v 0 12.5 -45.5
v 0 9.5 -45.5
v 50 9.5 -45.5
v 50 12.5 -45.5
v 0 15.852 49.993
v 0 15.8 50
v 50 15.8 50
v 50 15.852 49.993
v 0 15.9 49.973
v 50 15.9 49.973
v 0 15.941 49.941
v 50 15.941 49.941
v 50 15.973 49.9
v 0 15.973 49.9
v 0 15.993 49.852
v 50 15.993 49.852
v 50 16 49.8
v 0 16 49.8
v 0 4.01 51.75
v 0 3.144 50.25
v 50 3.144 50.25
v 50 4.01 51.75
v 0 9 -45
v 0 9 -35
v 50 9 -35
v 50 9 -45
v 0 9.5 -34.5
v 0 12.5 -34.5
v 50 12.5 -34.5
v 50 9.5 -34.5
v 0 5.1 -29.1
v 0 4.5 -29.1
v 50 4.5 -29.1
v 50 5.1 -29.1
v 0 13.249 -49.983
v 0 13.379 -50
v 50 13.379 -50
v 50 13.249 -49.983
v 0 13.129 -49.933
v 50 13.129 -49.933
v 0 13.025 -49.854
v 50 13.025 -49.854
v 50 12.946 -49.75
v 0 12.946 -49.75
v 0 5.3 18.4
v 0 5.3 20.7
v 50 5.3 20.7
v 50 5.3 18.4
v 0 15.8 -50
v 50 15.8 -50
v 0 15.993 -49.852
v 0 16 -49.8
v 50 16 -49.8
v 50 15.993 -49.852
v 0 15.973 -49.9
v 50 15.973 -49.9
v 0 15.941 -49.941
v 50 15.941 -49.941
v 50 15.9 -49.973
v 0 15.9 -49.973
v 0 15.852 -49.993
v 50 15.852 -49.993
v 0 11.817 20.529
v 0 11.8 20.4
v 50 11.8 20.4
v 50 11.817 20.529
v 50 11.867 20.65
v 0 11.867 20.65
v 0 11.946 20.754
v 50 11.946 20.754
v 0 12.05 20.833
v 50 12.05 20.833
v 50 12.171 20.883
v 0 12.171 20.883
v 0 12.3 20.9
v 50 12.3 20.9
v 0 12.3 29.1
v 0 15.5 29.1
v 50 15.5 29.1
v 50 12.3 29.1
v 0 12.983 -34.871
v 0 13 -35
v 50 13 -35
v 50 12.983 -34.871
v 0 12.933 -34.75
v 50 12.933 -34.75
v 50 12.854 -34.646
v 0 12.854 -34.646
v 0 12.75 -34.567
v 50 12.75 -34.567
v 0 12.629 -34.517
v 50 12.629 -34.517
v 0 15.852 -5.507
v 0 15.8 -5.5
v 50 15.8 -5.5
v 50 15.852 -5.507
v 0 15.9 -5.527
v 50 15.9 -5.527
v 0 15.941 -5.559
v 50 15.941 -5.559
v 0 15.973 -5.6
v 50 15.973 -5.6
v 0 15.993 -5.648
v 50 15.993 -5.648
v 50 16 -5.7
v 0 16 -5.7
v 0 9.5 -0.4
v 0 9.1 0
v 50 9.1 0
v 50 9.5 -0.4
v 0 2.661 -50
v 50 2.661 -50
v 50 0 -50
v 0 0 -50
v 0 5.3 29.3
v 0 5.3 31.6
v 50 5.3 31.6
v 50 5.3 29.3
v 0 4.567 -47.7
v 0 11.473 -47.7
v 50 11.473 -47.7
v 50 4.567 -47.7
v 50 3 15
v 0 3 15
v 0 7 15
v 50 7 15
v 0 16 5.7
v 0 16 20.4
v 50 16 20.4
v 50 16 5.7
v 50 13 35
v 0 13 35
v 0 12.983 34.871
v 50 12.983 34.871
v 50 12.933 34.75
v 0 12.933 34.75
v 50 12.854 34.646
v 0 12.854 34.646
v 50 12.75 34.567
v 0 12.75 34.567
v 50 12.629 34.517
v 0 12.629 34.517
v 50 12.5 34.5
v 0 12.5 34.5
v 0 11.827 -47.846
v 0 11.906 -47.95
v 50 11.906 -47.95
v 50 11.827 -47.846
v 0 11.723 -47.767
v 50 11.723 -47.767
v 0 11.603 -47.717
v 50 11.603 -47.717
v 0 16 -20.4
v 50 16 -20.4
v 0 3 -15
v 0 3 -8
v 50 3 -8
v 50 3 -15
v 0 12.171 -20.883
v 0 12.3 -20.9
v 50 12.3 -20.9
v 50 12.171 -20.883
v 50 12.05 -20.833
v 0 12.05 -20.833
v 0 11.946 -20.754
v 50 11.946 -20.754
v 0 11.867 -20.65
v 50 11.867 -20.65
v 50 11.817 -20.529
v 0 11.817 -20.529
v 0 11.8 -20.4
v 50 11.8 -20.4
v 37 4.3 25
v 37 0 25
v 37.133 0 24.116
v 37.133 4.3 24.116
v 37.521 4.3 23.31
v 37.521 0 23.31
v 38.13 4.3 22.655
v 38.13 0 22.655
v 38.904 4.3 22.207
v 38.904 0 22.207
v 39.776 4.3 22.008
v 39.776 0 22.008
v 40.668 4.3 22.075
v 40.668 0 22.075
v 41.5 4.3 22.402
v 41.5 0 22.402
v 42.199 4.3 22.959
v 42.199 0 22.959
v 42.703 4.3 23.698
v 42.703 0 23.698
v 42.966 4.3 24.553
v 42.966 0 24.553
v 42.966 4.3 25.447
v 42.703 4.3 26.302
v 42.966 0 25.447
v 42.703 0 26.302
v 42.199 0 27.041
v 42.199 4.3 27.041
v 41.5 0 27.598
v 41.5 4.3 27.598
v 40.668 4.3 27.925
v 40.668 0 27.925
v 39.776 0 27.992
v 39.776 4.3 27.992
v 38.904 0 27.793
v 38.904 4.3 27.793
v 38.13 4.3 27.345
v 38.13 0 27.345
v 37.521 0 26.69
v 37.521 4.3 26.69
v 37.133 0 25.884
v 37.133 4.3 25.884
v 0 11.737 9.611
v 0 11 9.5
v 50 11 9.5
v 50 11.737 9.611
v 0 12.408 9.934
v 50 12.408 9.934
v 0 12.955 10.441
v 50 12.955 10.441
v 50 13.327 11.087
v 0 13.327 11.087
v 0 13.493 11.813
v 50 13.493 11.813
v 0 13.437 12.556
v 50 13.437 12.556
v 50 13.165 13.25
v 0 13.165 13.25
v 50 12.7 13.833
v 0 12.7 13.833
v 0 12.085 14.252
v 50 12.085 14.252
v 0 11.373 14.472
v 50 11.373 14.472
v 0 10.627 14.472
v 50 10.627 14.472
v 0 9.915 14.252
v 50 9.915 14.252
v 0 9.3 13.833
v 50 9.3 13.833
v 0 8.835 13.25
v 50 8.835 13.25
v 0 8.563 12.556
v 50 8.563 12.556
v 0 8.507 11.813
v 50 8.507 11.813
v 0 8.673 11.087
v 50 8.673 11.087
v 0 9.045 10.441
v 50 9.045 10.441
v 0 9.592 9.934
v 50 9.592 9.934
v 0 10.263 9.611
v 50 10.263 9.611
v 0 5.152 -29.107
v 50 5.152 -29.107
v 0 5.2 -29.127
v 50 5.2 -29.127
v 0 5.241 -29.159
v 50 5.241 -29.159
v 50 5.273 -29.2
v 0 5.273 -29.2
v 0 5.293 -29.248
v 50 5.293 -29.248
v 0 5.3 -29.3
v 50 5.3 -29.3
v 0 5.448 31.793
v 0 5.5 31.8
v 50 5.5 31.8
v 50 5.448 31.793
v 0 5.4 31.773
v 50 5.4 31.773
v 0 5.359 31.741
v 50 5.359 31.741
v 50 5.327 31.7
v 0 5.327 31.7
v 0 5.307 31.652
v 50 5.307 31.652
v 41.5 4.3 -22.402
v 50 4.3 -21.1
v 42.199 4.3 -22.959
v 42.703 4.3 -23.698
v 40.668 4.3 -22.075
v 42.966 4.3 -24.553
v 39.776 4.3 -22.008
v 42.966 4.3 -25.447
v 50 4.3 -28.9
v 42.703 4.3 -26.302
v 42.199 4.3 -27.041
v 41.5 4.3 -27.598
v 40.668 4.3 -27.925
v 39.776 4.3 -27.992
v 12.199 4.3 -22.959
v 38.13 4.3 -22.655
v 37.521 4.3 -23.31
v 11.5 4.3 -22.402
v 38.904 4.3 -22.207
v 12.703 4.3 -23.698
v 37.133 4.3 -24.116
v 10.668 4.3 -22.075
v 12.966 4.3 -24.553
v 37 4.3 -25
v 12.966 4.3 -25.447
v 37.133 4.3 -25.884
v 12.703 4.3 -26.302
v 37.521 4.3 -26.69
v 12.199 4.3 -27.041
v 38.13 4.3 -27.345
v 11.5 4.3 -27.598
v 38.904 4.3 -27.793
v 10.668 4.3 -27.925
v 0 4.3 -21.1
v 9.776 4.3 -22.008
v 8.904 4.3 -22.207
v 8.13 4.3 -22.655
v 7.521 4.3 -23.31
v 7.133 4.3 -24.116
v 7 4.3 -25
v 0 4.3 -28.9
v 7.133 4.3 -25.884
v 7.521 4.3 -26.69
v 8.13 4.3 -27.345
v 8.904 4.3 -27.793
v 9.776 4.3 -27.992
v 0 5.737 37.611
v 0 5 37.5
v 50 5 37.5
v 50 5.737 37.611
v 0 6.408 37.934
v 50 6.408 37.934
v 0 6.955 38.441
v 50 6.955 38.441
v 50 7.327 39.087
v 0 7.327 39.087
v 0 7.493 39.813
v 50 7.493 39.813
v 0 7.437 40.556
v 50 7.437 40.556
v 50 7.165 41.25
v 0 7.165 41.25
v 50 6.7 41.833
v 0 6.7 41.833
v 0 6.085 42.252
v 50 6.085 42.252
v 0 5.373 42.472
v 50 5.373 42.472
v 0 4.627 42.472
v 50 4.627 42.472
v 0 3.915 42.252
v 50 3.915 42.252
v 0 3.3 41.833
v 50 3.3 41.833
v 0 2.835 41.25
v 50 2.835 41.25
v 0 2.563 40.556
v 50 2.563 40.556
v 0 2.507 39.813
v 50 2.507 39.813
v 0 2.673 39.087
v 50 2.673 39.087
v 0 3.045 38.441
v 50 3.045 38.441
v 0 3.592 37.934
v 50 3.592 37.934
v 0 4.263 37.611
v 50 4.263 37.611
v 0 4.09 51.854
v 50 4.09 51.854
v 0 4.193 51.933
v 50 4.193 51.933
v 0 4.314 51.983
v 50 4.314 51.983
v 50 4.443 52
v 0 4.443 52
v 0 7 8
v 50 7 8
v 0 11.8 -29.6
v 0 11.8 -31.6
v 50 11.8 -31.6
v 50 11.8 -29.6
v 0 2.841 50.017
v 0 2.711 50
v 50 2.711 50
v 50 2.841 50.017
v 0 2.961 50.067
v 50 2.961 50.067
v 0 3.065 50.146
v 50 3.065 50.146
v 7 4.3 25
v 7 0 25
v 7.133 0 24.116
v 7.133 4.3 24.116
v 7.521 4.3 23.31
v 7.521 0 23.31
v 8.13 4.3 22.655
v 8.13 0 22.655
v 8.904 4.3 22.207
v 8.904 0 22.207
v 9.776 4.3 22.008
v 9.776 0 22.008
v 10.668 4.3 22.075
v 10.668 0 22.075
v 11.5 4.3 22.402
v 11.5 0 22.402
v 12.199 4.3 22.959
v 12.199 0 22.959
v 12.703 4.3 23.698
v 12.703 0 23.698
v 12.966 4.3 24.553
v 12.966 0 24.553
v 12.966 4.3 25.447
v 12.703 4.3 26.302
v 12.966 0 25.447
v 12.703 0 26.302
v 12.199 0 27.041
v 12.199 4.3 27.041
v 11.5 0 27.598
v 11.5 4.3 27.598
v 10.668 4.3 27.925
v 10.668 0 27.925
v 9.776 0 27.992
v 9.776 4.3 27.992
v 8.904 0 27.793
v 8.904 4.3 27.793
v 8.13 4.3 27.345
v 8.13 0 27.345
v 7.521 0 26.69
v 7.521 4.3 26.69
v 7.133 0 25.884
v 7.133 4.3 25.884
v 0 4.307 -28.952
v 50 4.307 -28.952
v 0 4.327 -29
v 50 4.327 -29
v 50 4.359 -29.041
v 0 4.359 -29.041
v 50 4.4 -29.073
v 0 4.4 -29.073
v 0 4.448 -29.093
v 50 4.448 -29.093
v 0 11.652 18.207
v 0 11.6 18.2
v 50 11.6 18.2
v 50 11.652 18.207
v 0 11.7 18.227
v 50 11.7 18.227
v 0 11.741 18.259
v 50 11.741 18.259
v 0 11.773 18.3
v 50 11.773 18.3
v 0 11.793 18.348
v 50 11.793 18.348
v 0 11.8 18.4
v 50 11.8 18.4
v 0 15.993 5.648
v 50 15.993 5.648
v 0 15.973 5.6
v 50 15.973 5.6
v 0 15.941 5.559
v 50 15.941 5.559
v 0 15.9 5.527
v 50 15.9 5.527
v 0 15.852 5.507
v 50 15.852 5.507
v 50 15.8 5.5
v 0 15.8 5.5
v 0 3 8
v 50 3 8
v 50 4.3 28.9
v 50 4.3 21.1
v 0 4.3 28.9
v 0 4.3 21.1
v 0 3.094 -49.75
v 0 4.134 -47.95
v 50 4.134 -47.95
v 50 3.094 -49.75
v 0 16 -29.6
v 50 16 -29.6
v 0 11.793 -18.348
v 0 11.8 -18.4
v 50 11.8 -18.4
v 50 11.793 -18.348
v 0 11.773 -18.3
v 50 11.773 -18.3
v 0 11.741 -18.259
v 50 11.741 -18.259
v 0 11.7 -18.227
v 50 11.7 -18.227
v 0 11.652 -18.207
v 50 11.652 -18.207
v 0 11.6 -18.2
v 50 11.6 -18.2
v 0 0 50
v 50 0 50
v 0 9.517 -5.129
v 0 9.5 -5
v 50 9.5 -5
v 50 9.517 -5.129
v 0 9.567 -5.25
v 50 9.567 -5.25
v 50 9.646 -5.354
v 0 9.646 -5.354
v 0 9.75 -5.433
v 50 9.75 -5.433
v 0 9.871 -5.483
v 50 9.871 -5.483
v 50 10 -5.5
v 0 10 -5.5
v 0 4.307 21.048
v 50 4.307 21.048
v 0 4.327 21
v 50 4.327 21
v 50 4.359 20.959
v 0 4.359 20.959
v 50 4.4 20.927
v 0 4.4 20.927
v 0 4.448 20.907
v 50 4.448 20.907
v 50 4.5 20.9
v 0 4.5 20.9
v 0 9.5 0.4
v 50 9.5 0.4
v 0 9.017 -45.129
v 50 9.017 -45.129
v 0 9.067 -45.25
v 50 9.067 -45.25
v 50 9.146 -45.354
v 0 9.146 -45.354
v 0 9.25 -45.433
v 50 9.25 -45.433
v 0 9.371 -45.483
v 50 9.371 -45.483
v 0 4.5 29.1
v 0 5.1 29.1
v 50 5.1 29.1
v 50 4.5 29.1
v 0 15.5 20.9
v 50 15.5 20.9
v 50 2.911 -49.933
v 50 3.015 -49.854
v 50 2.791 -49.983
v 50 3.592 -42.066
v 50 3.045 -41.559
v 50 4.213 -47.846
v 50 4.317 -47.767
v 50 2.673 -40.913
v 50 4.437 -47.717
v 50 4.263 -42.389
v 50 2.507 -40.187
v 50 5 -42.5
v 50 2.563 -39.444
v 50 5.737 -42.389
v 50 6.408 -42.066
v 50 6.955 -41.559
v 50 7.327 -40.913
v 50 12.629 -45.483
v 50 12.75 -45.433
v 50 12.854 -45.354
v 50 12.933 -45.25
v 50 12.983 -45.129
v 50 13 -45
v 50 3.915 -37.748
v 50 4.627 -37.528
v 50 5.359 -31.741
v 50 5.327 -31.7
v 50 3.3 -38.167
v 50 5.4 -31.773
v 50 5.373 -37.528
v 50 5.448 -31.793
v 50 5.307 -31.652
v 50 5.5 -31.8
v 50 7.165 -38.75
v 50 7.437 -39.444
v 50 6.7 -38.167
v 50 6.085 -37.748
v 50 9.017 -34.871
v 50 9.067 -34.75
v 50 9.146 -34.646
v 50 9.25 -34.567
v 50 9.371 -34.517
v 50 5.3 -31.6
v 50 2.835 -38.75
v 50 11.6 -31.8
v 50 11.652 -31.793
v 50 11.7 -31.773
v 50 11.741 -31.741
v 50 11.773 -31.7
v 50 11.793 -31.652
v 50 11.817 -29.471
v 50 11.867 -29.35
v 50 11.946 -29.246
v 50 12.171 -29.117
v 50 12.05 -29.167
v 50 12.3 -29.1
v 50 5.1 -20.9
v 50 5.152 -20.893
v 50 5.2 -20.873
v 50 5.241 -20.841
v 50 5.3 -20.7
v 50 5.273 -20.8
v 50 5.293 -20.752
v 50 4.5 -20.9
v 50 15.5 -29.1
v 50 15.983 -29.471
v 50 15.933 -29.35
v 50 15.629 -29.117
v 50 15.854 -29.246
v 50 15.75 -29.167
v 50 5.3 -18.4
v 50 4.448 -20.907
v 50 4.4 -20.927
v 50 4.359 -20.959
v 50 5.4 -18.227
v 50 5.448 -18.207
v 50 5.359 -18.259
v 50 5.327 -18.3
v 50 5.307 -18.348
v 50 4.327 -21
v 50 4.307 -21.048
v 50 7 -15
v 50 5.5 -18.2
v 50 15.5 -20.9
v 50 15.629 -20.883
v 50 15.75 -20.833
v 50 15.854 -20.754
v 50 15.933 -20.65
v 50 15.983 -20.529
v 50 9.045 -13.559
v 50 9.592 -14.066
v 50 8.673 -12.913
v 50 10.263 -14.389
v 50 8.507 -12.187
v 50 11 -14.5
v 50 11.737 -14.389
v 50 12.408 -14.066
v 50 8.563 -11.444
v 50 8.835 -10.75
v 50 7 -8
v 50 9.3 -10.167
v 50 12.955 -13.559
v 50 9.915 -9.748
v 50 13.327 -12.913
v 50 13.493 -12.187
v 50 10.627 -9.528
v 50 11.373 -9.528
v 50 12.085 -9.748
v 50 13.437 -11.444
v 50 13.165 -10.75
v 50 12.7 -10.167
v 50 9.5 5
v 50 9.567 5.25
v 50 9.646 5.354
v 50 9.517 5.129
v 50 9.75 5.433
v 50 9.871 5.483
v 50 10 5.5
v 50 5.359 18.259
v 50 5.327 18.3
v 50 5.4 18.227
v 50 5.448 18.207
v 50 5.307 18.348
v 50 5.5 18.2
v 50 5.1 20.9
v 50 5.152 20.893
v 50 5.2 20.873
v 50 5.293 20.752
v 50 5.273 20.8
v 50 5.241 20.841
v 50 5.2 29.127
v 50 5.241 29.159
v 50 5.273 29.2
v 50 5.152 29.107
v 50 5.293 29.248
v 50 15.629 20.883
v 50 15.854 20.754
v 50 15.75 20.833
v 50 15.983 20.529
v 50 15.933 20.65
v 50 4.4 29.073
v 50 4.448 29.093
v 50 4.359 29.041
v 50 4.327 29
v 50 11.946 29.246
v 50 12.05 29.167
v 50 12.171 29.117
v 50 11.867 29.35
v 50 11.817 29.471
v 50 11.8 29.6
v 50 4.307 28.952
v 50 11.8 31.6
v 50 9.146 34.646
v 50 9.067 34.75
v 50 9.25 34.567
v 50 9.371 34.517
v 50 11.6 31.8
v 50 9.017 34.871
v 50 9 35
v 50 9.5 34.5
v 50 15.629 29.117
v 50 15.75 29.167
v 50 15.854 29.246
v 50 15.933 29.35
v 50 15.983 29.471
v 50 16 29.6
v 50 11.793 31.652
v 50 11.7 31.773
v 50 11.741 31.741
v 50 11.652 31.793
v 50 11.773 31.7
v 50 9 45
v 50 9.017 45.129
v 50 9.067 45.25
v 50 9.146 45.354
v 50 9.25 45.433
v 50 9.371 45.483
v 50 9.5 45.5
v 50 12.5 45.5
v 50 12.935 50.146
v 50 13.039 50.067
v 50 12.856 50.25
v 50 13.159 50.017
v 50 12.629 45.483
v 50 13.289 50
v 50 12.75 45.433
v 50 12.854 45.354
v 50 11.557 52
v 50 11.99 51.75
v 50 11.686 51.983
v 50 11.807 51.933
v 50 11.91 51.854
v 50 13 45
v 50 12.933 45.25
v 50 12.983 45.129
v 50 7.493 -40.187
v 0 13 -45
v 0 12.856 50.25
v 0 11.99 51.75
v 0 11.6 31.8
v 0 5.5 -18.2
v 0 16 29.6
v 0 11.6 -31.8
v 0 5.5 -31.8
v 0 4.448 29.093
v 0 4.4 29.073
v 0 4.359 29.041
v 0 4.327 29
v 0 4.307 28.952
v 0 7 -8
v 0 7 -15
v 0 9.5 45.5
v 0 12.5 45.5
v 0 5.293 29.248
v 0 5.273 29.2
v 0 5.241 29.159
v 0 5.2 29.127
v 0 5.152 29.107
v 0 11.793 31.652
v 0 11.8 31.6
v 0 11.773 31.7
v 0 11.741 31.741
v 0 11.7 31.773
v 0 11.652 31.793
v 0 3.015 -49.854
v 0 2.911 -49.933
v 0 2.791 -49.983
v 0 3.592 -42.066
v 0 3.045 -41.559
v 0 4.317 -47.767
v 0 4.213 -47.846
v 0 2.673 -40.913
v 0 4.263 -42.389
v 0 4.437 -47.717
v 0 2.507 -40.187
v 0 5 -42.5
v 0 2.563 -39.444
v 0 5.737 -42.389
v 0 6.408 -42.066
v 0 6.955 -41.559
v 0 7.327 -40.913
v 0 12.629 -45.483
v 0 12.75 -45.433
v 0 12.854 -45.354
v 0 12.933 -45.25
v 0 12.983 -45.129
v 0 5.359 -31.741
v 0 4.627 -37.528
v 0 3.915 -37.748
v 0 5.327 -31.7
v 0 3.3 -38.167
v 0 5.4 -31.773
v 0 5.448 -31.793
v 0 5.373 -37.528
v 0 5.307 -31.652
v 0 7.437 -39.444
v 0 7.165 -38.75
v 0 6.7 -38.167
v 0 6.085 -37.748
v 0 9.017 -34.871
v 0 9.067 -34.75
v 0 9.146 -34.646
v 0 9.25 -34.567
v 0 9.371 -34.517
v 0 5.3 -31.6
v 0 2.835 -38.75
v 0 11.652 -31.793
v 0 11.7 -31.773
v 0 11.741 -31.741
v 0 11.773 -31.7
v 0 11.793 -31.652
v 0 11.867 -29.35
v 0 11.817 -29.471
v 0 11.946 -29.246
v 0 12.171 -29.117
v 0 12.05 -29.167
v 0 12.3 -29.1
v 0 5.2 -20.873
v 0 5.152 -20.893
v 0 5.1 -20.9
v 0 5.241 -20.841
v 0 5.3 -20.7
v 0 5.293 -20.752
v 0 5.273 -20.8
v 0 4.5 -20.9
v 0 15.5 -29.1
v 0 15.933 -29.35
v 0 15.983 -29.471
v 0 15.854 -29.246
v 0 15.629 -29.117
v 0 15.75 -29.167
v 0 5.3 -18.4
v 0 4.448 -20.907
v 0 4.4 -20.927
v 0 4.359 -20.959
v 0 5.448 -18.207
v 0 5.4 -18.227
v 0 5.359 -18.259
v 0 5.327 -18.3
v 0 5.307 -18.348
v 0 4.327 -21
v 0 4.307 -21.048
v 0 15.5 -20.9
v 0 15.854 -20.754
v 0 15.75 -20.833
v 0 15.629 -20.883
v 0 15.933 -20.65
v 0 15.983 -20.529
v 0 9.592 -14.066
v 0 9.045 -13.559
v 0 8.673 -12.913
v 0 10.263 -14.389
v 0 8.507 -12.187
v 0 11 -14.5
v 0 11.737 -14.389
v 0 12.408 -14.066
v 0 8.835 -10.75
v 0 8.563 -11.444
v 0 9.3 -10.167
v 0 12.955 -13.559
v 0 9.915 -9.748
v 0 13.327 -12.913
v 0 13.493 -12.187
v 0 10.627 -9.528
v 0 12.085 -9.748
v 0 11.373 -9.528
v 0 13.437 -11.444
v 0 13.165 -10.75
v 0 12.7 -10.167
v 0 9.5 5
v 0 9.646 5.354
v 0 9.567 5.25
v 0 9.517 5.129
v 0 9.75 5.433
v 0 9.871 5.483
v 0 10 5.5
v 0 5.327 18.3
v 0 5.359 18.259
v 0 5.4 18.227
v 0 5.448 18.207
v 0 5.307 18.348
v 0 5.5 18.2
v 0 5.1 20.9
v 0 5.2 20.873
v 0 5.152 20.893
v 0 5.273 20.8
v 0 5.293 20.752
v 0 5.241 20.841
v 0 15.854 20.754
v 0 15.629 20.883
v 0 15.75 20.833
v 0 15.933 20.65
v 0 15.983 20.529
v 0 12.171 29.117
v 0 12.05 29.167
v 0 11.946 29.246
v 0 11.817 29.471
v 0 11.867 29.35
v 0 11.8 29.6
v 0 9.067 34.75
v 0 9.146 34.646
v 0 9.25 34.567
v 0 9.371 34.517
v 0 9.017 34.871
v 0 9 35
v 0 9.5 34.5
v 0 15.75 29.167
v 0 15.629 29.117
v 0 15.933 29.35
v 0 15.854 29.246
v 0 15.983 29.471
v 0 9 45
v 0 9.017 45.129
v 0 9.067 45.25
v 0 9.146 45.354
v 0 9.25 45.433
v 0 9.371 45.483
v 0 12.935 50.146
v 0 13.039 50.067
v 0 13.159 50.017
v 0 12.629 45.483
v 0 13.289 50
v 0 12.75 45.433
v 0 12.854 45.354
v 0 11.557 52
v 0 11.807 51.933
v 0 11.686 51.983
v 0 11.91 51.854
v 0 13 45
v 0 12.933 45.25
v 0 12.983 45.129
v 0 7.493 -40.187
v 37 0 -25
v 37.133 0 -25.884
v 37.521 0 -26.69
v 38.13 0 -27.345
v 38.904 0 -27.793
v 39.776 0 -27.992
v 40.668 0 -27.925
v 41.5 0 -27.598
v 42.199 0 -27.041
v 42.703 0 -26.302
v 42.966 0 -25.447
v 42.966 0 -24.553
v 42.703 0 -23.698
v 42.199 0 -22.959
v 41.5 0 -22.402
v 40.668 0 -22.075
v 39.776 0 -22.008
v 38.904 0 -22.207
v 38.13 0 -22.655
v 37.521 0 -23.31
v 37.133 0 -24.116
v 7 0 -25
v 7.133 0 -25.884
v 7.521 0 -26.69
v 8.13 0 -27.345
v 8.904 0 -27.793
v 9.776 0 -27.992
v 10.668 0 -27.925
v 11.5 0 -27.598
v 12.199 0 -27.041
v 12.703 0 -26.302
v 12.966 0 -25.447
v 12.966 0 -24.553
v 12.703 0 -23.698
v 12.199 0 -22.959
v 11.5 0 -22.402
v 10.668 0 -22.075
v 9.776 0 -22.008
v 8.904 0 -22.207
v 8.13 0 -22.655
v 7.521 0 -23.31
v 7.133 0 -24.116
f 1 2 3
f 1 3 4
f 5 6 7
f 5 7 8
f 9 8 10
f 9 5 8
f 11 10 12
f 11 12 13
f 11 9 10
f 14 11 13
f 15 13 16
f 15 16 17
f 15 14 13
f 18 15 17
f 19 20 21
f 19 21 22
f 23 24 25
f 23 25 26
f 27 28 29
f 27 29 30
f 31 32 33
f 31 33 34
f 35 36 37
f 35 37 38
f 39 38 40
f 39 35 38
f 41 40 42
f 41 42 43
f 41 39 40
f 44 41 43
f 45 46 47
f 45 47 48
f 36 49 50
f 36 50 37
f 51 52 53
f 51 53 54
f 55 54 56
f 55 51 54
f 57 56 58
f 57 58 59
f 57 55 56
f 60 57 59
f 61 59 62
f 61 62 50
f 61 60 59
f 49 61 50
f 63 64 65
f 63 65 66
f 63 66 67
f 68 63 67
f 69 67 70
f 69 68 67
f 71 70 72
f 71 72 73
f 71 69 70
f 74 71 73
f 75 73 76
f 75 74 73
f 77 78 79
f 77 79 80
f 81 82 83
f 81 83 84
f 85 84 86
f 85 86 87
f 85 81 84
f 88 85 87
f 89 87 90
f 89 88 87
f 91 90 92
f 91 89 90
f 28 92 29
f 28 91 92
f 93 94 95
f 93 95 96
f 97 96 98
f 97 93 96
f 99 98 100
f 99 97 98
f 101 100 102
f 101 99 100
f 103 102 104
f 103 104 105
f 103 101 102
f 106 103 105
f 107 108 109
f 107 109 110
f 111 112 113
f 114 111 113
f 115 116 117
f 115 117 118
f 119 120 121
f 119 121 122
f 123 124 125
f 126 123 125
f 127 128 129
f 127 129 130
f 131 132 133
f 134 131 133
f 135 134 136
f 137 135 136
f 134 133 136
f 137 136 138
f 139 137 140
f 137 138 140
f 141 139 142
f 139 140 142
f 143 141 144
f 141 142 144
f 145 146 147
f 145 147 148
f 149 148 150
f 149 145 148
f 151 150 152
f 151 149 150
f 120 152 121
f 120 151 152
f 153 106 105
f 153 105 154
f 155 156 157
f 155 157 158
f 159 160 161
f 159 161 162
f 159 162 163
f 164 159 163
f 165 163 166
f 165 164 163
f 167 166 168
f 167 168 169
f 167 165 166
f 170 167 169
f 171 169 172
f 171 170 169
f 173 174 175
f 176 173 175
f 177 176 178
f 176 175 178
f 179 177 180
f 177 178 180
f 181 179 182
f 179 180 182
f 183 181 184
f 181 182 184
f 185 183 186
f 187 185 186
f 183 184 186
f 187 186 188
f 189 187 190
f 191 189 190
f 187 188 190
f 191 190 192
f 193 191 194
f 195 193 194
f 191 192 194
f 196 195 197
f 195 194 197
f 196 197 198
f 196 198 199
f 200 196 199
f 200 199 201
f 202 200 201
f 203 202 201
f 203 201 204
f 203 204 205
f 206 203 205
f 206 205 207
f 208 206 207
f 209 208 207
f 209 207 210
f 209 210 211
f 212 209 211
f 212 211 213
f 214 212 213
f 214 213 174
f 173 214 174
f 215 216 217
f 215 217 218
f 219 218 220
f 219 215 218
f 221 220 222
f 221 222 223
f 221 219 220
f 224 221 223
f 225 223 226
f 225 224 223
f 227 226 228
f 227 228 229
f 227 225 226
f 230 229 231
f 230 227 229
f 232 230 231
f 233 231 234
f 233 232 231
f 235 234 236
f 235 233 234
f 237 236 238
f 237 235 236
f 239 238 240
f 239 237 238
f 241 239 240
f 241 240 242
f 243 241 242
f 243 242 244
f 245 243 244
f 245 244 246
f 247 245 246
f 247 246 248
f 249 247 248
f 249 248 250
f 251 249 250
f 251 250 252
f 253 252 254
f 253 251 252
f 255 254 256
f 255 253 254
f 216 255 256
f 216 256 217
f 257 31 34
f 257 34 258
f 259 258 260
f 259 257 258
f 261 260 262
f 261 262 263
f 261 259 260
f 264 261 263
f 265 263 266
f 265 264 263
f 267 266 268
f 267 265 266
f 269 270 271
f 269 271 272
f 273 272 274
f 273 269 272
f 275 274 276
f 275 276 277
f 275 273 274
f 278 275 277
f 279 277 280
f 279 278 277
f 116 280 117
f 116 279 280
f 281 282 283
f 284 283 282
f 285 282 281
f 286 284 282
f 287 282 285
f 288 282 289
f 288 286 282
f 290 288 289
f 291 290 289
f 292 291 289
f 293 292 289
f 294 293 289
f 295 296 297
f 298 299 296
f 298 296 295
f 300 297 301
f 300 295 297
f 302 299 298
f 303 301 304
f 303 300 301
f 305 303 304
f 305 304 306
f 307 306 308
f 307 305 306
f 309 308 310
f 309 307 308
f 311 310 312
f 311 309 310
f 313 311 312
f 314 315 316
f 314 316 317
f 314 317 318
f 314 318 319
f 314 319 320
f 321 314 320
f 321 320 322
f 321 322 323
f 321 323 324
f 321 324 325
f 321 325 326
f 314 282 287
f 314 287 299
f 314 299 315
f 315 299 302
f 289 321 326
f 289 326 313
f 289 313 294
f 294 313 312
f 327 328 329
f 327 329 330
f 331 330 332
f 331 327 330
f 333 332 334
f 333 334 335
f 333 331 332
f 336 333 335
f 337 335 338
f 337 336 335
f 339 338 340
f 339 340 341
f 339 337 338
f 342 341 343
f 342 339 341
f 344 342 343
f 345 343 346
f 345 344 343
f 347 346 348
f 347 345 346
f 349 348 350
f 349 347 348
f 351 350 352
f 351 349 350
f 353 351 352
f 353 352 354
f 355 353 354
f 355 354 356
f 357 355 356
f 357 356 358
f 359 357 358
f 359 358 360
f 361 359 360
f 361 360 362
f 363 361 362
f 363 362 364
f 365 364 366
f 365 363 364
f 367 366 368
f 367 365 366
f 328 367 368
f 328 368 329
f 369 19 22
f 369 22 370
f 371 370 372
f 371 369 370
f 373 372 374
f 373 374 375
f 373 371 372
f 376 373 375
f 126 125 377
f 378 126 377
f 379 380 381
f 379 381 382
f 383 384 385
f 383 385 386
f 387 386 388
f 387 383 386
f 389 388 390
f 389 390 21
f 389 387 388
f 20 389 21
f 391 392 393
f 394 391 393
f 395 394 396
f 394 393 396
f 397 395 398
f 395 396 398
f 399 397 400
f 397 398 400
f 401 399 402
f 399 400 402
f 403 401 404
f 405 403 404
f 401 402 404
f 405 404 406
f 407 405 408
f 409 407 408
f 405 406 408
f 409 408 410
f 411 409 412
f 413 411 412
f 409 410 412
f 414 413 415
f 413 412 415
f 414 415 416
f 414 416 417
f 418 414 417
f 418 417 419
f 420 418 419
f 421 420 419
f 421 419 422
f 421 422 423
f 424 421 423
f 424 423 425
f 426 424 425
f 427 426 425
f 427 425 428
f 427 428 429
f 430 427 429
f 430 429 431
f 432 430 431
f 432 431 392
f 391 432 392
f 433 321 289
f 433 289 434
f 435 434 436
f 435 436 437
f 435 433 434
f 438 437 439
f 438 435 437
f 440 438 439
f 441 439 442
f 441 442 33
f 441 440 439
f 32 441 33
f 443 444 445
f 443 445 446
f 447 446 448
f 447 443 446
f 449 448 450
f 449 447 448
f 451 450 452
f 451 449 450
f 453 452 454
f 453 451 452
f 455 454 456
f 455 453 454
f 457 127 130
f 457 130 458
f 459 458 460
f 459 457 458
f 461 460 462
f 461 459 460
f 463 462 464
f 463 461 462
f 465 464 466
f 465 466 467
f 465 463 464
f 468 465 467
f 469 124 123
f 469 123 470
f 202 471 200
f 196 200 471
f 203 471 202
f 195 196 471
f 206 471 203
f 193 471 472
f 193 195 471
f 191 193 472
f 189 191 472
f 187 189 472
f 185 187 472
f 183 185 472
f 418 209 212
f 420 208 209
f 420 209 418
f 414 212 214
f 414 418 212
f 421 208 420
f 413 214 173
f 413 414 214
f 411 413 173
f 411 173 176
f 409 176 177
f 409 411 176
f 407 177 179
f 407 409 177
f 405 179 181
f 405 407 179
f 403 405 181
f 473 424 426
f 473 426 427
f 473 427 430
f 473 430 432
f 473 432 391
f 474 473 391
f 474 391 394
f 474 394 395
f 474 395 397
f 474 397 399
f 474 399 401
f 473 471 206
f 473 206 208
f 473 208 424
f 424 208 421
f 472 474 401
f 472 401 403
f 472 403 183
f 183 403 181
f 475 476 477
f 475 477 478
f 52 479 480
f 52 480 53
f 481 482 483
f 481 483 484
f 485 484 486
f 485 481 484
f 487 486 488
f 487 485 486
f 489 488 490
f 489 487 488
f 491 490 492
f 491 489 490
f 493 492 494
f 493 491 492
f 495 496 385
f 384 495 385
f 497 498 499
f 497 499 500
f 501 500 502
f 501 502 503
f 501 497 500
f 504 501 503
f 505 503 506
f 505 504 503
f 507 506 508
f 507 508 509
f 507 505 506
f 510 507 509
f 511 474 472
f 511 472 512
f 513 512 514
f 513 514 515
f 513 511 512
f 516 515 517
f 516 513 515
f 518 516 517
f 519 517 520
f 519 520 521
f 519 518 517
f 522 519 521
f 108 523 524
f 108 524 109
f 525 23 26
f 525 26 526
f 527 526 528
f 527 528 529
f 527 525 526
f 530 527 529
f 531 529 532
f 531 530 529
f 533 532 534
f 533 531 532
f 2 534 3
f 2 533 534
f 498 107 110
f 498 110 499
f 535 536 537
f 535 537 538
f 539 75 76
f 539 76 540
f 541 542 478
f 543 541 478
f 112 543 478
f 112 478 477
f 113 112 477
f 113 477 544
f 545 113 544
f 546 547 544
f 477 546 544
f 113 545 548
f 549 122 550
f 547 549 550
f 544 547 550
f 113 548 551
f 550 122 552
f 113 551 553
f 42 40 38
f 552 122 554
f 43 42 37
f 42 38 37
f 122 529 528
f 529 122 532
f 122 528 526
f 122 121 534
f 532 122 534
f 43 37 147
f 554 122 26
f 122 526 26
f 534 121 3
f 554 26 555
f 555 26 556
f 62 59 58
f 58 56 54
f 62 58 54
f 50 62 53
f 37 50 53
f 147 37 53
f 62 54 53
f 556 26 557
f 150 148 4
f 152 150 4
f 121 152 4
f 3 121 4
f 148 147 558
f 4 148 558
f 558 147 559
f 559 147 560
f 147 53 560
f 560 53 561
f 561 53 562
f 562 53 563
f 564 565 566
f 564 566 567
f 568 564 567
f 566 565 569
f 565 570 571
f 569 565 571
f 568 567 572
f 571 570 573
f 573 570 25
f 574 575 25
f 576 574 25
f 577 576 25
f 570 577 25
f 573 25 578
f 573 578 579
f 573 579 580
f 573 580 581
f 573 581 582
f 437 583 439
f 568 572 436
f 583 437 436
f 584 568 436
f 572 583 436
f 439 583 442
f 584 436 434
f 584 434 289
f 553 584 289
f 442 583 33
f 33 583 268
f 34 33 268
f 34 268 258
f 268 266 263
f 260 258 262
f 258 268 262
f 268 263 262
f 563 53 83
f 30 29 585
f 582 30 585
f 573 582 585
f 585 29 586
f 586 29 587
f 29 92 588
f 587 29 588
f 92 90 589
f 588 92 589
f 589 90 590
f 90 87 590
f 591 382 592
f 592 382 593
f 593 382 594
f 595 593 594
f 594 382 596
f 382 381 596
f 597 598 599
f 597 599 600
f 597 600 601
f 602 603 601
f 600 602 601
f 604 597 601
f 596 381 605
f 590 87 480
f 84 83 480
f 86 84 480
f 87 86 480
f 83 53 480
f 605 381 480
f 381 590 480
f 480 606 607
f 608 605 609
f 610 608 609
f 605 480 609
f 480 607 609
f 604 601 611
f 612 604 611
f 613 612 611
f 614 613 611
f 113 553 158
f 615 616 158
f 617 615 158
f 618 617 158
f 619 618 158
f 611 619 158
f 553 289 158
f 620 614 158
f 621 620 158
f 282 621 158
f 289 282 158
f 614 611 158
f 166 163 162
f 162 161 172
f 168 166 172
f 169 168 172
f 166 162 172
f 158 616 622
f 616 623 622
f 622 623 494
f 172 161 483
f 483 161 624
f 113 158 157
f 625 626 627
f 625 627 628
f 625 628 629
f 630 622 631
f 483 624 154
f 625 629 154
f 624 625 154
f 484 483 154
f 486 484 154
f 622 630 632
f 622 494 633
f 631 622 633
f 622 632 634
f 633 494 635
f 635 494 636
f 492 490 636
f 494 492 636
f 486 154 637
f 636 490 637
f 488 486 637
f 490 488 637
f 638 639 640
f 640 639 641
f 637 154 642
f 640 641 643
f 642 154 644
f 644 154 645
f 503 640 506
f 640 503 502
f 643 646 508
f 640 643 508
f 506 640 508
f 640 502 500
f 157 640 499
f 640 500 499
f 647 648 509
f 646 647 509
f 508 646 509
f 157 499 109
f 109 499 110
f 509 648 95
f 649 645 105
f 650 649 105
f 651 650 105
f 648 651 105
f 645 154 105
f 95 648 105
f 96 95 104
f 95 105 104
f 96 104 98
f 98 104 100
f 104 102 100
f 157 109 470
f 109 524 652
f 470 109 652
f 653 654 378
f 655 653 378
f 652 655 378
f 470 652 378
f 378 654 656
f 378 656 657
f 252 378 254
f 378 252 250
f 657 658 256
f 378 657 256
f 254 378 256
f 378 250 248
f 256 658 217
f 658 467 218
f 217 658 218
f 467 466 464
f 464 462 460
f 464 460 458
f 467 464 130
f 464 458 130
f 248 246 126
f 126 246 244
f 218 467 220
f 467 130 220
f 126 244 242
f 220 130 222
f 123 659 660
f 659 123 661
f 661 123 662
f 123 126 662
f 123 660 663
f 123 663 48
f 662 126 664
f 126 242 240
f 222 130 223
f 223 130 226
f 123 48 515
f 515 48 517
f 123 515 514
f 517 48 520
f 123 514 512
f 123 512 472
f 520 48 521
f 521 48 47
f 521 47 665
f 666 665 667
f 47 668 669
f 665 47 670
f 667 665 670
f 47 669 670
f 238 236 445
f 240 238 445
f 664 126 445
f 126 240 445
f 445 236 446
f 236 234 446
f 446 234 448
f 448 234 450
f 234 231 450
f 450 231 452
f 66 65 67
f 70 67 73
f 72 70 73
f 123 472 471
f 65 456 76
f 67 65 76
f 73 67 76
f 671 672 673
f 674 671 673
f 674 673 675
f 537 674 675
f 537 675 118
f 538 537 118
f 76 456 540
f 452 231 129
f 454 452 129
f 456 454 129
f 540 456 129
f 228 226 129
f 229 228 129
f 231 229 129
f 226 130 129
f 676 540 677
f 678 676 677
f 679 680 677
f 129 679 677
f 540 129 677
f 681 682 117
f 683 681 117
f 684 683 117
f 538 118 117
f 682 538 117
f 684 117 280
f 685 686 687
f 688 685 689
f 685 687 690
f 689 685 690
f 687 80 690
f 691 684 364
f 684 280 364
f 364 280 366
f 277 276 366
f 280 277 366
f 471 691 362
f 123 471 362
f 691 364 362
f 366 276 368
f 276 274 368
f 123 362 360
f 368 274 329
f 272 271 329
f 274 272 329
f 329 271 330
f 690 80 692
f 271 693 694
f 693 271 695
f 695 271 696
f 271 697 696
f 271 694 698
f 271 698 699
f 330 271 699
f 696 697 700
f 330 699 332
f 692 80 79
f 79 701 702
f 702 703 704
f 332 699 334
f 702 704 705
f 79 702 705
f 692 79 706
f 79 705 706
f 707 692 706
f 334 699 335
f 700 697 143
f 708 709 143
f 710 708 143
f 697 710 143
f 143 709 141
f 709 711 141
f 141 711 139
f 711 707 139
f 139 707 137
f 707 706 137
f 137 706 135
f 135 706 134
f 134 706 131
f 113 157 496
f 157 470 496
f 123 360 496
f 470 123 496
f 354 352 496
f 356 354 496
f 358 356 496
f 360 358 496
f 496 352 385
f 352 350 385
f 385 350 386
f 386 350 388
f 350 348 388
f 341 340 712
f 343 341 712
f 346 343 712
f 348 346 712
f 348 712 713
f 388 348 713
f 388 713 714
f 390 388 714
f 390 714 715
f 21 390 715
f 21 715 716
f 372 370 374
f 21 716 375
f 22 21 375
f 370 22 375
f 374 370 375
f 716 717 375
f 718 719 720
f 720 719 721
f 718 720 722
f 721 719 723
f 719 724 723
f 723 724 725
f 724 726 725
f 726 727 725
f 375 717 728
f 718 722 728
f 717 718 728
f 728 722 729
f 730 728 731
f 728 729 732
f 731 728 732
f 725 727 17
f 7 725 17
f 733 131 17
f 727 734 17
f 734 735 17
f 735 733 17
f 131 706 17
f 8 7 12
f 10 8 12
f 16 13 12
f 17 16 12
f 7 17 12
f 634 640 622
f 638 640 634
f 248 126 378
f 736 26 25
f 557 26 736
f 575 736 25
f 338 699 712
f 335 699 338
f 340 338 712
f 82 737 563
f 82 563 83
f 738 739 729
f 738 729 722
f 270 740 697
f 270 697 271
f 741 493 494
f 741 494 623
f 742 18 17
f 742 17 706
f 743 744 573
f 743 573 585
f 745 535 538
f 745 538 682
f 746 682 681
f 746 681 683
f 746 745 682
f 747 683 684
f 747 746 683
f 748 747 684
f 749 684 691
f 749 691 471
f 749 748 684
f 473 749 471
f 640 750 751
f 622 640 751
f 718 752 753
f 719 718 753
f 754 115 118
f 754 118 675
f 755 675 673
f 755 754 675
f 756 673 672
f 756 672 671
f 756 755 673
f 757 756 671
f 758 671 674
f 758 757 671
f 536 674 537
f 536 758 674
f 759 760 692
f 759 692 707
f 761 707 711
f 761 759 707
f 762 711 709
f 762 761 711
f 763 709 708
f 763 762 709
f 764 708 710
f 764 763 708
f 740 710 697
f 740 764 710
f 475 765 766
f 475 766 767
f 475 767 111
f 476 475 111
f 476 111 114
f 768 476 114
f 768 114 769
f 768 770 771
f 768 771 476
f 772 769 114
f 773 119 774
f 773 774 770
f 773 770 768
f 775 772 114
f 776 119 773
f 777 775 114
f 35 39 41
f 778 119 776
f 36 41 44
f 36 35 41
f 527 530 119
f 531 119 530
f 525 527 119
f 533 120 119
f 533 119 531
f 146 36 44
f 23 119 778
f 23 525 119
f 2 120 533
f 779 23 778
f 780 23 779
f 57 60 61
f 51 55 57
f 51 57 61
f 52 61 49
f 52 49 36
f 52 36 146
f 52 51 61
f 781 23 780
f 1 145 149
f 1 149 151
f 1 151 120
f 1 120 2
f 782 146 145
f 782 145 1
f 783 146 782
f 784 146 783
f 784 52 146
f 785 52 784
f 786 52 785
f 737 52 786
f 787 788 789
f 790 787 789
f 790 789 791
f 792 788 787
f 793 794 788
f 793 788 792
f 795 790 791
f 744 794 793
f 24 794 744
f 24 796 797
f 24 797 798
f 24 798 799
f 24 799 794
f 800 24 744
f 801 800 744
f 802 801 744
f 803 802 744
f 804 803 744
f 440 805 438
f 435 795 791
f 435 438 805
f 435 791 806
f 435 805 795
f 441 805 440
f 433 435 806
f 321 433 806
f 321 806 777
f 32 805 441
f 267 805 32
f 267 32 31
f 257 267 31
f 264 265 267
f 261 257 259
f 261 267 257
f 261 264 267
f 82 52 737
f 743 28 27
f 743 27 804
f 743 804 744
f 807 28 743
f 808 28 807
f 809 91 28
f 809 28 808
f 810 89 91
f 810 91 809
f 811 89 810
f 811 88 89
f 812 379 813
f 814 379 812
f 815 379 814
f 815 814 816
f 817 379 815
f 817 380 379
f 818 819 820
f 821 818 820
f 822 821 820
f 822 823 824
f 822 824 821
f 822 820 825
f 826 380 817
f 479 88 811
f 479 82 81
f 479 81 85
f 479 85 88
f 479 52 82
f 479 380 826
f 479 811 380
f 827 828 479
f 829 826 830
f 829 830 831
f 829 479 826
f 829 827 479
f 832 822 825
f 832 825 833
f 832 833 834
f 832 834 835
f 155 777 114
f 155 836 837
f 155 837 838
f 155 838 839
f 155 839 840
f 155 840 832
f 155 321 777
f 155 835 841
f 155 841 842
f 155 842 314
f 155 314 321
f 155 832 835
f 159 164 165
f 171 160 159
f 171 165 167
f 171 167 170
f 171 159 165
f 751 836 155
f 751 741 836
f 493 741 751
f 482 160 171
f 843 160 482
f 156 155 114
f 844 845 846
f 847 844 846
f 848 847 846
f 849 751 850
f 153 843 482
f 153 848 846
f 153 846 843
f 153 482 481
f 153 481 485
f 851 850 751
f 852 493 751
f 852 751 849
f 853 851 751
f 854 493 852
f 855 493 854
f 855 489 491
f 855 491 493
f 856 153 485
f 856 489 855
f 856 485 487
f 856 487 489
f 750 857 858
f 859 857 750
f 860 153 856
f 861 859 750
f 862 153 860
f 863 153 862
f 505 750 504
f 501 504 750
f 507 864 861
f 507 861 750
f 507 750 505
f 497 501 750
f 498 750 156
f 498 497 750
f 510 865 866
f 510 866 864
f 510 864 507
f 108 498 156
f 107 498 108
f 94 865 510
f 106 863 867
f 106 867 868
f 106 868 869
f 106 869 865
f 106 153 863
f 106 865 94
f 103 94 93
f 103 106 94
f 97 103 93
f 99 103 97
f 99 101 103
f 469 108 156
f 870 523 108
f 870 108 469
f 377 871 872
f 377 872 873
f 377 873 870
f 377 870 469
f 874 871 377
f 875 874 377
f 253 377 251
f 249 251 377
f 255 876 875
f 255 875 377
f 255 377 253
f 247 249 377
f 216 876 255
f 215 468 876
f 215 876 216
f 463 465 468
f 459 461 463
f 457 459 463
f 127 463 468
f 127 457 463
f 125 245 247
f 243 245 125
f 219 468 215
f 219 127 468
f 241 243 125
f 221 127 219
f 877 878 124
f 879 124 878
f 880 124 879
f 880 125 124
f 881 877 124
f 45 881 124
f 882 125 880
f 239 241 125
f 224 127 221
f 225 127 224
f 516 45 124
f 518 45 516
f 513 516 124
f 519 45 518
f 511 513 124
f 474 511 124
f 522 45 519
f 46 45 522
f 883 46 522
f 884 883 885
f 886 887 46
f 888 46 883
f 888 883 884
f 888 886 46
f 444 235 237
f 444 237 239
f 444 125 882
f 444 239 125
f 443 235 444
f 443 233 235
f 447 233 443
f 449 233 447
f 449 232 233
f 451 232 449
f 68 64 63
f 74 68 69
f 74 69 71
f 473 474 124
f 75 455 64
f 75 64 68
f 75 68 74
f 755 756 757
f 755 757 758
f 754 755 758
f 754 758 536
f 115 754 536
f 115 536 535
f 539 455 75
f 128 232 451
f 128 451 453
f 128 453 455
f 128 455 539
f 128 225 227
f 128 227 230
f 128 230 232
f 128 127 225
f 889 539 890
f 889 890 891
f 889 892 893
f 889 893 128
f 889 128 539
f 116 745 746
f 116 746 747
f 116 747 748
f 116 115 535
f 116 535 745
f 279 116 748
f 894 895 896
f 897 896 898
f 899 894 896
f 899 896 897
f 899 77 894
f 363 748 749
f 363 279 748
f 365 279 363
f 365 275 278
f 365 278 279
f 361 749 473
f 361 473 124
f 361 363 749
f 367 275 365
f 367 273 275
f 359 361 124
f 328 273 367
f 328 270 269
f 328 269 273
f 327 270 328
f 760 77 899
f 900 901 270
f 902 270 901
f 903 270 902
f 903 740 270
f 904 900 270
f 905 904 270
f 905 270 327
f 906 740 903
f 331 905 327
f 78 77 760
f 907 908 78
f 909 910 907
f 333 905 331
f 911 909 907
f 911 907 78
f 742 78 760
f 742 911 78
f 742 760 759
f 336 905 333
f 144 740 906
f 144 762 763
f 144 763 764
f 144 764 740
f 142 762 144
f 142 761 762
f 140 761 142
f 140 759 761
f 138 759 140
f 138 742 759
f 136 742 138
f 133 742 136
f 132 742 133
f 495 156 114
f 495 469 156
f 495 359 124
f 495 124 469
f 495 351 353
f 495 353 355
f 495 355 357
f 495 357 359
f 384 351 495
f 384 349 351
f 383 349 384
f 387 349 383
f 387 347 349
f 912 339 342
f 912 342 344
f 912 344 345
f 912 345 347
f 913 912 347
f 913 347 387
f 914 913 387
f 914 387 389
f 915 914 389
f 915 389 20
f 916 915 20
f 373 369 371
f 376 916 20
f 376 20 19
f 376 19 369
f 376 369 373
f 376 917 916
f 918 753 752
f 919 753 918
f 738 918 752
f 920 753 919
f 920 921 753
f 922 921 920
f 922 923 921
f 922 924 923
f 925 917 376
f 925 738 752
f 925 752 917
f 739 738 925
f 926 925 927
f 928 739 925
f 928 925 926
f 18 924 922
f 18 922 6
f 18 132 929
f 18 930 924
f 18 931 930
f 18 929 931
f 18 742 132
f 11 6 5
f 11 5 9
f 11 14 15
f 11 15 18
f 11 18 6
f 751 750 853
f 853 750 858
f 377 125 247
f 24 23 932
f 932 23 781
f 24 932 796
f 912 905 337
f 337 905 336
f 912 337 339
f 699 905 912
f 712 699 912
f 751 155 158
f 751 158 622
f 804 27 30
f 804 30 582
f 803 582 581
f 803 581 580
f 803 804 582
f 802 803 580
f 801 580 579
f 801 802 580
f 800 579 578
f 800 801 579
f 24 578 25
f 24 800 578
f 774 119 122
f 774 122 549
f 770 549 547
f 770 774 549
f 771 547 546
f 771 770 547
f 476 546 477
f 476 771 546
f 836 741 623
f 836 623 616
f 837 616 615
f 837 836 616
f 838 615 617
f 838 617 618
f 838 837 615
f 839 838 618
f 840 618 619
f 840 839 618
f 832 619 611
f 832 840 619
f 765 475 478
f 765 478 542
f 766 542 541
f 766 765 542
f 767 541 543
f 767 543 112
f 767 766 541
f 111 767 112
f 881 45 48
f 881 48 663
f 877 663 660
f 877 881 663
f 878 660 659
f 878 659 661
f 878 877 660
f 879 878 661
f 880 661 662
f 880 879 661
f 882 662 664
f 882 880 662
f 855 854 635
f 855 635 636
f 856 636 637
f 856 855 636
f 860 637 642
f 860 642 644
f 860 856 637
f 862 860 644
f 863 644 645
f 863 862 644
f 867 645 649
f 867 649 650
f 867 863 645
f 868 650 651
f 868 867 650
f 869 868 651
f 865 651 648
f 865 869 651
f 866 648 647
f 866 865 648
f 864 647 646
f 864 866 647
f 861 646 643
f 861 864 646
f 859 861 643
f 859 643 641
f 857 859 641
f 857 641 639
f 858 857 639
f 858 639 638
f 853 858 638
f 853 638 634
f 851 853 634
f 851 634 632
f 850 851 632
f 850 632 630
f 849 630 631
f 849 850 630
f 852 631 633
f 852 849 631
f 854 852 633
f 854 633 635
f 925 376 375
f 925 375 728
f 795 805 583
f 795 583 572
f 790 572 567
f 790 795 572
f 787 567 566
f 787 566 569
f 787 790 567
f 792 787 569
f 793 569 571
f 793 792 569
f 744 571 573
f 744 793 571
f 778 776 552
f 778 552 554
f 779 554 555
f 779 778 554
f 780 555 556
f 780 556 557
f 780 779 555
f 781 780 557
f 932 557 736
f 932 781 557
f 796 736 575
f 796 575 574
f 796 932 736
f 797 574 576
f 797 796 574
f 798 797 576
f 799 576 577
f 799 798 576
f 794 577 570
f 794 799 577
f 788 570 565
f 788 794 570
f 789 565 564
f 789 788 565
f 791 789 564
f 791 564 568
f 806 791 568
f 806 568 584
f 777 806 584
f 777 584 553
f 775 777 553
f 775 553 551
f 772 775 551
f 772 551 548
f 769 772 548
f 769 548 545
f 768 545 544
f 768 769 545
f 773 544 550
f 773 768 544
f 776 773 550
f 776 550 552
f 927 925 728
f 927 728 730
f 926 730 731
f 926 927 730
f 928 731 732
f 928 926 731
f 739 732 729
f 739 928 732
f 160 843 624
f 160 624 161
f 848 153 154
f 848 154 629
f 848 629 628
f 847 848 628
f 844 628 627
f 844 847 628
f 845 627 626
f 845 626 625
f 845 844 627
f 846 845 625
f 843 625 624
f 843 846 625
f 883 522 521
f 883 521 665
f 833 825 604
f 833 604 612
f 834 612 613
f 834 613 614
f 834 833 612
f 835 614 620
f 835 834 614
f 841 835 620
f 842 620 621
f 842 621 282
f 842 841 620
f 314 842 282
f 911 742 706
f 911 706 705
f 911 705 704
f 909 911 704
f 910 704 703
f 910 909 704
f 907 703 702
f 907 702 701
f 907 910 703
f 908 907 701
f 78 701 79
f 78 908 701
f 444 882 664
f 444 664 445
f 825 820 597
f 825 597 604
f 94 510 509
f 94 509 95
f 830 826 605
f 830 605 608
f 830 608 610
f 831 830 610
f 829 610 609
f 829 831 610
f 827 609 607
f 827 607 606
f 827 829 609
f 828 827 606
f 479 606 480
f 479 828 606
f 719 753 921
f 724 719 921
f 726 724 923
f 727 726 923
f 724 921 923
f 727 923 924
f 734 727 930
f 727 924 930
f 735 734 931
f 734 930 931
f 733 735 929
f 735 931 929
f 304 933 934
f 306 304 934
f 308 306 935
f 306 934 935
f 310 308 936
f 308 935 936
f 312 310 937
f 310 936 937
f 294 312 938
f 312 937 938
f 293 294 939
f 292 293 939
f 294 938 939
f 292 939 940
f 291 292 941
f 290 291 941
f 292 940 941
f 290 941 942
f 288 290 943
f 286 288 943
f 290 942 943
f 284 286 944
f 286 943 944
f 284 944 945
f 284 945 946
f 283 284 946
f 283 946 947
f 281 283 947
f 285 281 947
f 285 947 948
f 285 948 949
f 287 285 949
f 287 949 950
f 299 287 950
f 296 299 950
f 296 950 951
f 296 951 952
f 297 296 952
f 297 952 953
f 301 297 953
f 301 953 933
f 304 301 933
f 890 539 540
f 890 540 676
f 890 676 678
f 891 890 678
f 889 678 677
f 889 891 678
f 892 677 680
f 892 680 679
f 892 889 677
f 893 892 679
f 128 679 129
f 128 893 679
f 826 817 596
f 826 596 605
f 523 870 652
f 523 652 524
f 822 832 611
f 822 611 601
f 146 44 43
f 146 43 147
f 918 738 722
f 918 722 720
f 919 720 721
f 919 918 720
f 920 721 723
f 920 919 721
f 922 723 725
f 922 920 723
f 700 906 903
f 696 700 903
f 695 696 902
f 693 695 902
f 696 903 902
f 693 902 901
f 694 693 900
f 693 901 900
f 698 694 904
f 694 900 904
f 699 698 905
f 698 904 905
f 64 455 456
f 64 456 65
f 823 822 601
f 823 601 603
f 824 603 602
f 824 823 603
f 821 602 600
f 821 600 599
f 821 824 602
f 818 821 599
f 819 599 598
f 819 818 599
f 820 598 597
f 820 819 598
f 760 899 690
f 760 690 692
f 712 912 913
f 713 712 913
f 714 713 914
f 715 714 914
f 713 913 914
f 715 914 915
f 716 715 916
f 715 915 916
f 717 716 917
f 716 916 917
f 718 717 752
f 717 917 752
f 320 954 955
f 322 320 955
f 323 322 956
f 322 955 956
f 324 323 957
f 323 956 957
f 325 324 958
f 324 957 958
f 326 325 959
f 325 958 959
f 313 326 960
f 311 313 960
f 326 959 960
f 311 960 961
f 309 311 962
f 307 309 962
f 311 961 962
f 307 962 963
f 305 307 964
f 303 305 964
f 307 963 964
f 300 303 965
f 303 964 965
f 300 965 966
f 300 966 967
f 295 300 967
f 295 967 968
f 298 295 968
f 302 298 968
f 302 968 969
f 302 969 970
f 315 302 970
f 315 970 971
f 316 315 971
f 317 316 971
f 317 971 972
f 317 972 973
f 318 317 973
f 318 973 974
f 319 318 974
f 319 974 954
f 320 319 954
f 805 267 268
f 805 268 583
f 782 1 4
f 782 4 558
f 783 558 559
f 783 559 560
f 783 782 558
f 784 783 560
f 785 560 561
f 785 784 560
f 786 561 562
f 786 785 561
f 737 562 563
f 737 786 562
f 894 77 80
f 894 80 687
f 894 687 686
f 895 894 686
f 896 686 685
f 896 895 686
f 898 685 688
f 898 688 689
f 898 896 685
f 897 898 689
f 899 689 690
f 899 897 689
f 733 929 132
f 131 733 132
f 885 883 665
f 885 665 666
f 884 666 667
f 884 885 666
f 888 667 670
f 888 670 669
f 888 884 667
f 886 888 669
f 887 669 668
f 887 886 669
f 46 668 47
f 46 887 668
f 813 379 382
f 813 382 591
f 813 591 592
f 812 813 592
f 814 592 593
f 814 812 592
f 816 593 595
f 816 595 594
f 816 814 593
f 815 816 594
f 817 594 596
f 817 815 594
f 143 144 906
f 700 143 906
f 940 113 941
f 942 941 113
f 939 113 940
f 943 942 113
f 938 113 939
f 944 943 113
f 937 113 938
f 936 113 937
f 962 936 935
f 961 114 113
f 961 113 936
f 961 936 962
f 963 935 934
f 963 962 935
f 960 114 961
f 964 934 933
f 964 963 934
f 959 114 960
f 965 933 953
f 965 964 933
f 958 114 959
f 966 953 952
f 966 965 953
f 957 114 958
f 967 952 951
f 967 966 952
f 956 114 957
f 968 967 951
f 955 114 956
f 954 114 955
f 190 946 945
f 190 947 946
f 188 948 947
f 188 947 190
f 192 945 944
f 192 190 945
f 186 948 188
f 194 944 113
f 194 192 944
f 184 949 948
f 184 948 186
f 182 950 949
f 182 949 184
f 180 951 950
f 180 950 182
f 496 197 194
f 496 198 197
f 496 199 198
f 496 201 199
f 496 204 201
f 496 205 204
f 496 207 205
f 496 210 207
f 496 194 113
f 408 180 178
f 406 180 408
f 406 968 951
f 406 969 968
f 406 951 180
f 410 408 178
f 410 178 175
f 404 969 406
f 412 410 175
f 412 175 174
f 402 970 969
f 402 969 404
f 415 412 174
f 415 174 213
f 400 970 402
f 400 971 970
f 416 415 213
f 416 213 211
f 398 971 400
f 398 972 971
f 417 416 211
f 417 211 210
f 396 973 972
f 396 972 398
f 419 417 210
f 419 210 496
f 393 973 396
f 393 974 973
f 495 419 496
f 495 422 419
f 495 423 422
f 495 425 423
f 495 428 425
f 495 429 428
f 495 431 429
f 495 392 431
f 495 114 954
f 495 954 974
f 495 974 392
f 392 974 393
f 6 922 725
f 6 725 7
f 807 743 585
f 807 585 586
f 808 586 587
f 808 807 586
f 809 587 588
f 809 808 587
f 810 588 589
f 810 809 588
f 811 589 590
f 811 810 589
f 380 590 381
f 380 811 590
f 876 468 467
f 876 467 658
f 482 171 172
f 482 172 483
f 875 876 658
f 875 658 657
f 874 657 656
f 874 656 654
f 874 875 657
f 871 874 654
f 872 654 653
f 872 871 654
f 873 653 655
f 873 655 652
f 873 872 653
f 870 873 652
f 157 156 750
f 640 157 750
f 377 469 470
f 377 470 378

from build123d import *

# Parameters (mm, degrees)
SKETCH_1_R            = 2.5
SKETCH_1_W            = 7
SKETCH_1_H            = 4
EXTRUDE_1_DEPTH       = 50
HOLE_WIZARD_6_0_6_1_D = 6


with BuildPart() as part:
    # Эскиз1 → Бобышка-Вытянуть1 (new body)
    with BuildSketch(Plane(origin=(0, 0, 0), x_dir=(0, 0, -1), z_dir=(1, 0, 0))):
        with BuildLine():
            Line((-5.5, 15.8), (-5.5, 10))
            ThreePointArc((-5.5, 10), (-5.353553391, 9.646446609), (-5, 9.5))
            Line((-5, 9.5), (-0.4, 9.5))
            Line((-0.4, 9.5), (0, 9.1))
            Line((0, 9.1), (0.4, 9.5))
            Line((0.4, 9.5), (5, 9.5))
            ThreePointArc((5, 9.5), (5.353553391, 9.646446609), (5.5, 10))
            Line((5.5, 10), (5.5, 15.8))
            ThreePointArc((5.5, 15.8), (5.558578644, 15.941421356), (5.7, 16))
            Line((5.7, 16), (20.4, 16))
            ThreePointArc((20.4, 16), (20.753553391, 15.853553391), (20.9, 15.5))
            Line((20.9, 15.5), (20.9, 12.3))
            ThreePointArc((20.9, 12.3), (20.753553391, 11.946446609), (20.4, 11.8))
            Line((20.4, 11.8), (18.4, 11.8))
            ThreePointArc((18.4, 11.8), (18.258578644, 11.741421356), (18.2, 11.6))
            Line((18.2, 11.6), (18.2, 5.5))
            ThreePointArc((18.2, 5.5), (18.258578644, 5.358578644), (18.4, 5.3))
            Line((18.4, 5.3), (20.7, 5.3))
            ThreePointArc((20.7, 5.3), (20.841421356, 5.241421356), (20.9, 5.1))
            Line((20.9, 5.1), (20.9, 4.5))
            ThreePointArc((20.9, 4.5), (20.958578644, 4.358578644), (21.1, 4.3))
            Line((21.1, 4.3), (28.9, 4.3))
            ThreePointArc((28.9, 4.3), (29.041421356, 4.358578644), (29.1, 4.5))
            Line((29.1, 4.5), (29.1, 5.1))
            ThreePointArc((29.1, 5.1), (29.158578644, 5.241421356), (29.3, 5.3))
            Line((29.3, 5.3), (31.6, 5.3))
            ThreePointArc((31.6, 5.3), (31.741421356, 5.358578644), (31.8, 5.5))
            Line((31.8, 5.5), (31.8, 11.6))
            ThreePointArc((31.8, 11.6), (31.741421356, 11.741421356), (31.6, 11.8))
            Line((31.6, 11.8), (29.6, 11.8))
            ThreePointArc((29.6, 11.8), (29.246446609, 11.946446609), (29.1, 12.3))
            Line((29.1, 12.3), (29.1, 15.5))
            ThreePointArc((29.1, 15.5), (29.246446609, 15.853553391), (29.6, 16))
            Line((29.6, 16), (49.8, 16))
            ThreePointArc((49.8, 16), (49.941421356, 15.941421356), (50, 15.8))
            Line((50, 15.8), (50, 13.378675135))
            ThreePointArc((50, 13.378675135), (49.933012702, 13.128675135), (49.75, 12.945662433))
            Line((49.75, 12.945662433), (47.95, 11.906431948))
            ThreePointArc((47.95, 11.906431948), (47.766987298, 11.723419246), (47.7, 11.473419246))
            Line((47.7, 11.473419246), (47.7, 4.566580754))
            ThreePointArc((47.7, 4.566580754), (47.766987298, 4.316580754), (47.95, 4.133568052))
            Line((47.95, 4.133568052), (49.75, 3.094337567))
            ThreePointArc((49.75, 3.094337567), (49.933012702, 2.911324865), (50, 2.661324865))
            Line((50, 2.661324865), (50, 0))
            Line((50, 0), (-50, 0))
            Line((-50, 0), (-50, 2.711324865))
            ThreePointArc((-50, 2.711324865), (-50.066987298, 2.961324865), (-50.25, 3.144337567))
            Line((-50.25, 3.144337567), (-51.75, 4.010362971))
            ThreePointArc((-51.75, 4.010362971), (-51.933012702, 4.193375673), (-52, 4.443375673))
            Line((-52, 4.443375673), (-52, 11.556624327))
            ThreePointArc((-52, 11.556624327), (-51.933012702, 11.806624327), (-51.75, 11.989637029))
            Line((-51.75, 11.989637029), (-50.25, 12.855662433))
            ThreePointArc((-50.25, 12.855662433), (-50.066987298, 13.038675135), (-50, 13.288675135))
            Line((-50, 13.288675135), (-50, 15.8))
            ThreePointArc((-50, 15.8), (-49.941421356, 15.941421356), (-49.8, 16))
            Line((-49.8, 16), (-29.6, 16))
            ThreePointArc((-29.6, 16), (-29.246446609, 15.853553391), (-29.1, 15.5))
            Line((-29.1, 15.5), (-29.1, 12.3))
            ThreePointArc((-29.1, 12.3), (-29.246446609, 11.946446609), (-29.6, 11.8))
            Line((-29.6, 11.8), (-31.6, 11.8))
            ThreePointArc((-31.6, 11.8), (-31.741421356, 11.741421356), (-31.8, 11.6))
            Line((-31.8, 11.6), (-31.8, 5.5))
            ThreePointArc((-31.8, 5.5), (-31.741421356, 5.358578644), (-31.6, 5.3))
            Line((-31.6, 5.3), (-29.3, 5.3))
            ThreePointArc((-29.3, 5.3), (-29.158578644, 5.241421356), (-29.1, 5.1))
            Line((-29.1, 5.1), (-29.1, 4.5))
            ThreePointArc((-29.1, 4.5), (-29.041421356, 4.358578644), (-28.9, 4.3))
            Line((-28.9, 4.3), (-21.1, 4.3))
            ThreePointArc((-21.1, 4.3), (-20.958578644, 4.358578644), (-20.9, 4.5))
            Line((-20.9, 4.5), (-20.9, 5.1))
            ThreePointArc((-20.9, 5.1), (-20.841421356, 5.241421356), (-20.7, 5.3))
            Line((-20.7, 5.3), (-18.4, 5.3))
            ThreePointArc((-18.4, 5.3), (-18.258578644, 5.358578644), (-18.2, 5.5))
            Line((-18.2, 5.5), (-18.2, 11.6))
            ThreePointArc((-18.2, 11.6), (-18.258578644, 11.741421356), (-18.4, 11.8))
            Line((-18.4, 11.8), (-20.4, 11.8))
            ThreePointArc((-20.4, 11.8), (-20.753553391, 11.946446609), (-20.9, 12.3))
            Line((-20.9, 12.3), (-20.9, 15.5))
            ThreePointArc((-20.9, 15.5), (-20.753553391, 15.853553391), (-20.4, 16))
            Line((-20.4, 16), (-5.7, 16))
            ThreePointArc((-5.7, 16), (-5.558578644, 15.941421356), (-5.5, 15.8))
        make_face()
        with Locations((-12, 11)):
            Circle(SKETCH_1_R, mode=Mode.SUBTRACT)
        with Locations((12, 11)):
            Circle(SKETCH_1_R, mode=Mode.SUBTRACT)
        with Locations((-40, 5)):
            Circle(SKETCH_1_R, mode=Mode.SUBTRACT)
        with Locations((40, 5)):
            Circle(SKETCH_1_R, mode=Mode.SUBTRACT)
        with Locations((-11.5, 5)):
            Rectangle(SKETCH_1_W, SKETCH_1_H, mode=Mode.SUBTRACT)
        with Locations((11.5, 5)):
            Rectangle(SKETCH_1_W, SKETCH_1_H, mode=Mode.SUBTRACT)
        with BuildLine():
            Line((-45, 13), (-35, 13))
            ThreePointArc((-35, 13), (-34.646446609, 12.853553391), (-34.5, 12.5))
            Line((-34.5, 12.5), (-34.5, 9.5))
            ThreePointArc((-34.5, 9.5), (-34.646446609, 9.146446609), (-35, 9))
            Line((-35, 9), (-45, 9))
            ThreePointArc((-45, 9), (-45.353553391, 9.146446609), (-45.5, 9.5))
            Line((-45.5, 9.5), (-45.5, 12.5))
            ThreePointArc((-45.5, 12.5), (-45.353553391, 12.853553391), (-45, 13))
        make_face(mode=Mode.SUBTRACT)
        with BuildLine():
            Line((34.5, 12.5), (34.5, 9.5))
            ThreePointArc((34.5, 9.5), (34.646446609, 9.146446609), (35, 9))
            Line((35, 9), (45, 9))
            ThreePointArc((45, 9), (45.353553391, 9.146446609), (45.5, 9.5))
            Line((45.5, 9.5), (45.5, 12.5))
            ThreePointArc((45.5, 12.5), (45.353553391, 12.853553391), (45, 13))
            Line((45, 13), (35, 13))
            ThreePointArc((35, 13), (34.646446609, 12.853553391), (34.5, 12.5))
        make_face(mode=Mode.SUBTRACT)
    extrude(amount=EXTRUDE_1_DEPTH)

    # Диаметр отверстия Ø6.0 (6)1 (through all)
    with Locations(Plane(origin=(0, 4.3, 0), x_dir=(1, 0, 0), z_dir=(0, 1, 0))):
        with Locations((10, 25), (10, -25), (40, -25), (40, 25)):
            Hole(HOLE_WIZARD_6_0_6_1_D / 2)


solid = part.part
